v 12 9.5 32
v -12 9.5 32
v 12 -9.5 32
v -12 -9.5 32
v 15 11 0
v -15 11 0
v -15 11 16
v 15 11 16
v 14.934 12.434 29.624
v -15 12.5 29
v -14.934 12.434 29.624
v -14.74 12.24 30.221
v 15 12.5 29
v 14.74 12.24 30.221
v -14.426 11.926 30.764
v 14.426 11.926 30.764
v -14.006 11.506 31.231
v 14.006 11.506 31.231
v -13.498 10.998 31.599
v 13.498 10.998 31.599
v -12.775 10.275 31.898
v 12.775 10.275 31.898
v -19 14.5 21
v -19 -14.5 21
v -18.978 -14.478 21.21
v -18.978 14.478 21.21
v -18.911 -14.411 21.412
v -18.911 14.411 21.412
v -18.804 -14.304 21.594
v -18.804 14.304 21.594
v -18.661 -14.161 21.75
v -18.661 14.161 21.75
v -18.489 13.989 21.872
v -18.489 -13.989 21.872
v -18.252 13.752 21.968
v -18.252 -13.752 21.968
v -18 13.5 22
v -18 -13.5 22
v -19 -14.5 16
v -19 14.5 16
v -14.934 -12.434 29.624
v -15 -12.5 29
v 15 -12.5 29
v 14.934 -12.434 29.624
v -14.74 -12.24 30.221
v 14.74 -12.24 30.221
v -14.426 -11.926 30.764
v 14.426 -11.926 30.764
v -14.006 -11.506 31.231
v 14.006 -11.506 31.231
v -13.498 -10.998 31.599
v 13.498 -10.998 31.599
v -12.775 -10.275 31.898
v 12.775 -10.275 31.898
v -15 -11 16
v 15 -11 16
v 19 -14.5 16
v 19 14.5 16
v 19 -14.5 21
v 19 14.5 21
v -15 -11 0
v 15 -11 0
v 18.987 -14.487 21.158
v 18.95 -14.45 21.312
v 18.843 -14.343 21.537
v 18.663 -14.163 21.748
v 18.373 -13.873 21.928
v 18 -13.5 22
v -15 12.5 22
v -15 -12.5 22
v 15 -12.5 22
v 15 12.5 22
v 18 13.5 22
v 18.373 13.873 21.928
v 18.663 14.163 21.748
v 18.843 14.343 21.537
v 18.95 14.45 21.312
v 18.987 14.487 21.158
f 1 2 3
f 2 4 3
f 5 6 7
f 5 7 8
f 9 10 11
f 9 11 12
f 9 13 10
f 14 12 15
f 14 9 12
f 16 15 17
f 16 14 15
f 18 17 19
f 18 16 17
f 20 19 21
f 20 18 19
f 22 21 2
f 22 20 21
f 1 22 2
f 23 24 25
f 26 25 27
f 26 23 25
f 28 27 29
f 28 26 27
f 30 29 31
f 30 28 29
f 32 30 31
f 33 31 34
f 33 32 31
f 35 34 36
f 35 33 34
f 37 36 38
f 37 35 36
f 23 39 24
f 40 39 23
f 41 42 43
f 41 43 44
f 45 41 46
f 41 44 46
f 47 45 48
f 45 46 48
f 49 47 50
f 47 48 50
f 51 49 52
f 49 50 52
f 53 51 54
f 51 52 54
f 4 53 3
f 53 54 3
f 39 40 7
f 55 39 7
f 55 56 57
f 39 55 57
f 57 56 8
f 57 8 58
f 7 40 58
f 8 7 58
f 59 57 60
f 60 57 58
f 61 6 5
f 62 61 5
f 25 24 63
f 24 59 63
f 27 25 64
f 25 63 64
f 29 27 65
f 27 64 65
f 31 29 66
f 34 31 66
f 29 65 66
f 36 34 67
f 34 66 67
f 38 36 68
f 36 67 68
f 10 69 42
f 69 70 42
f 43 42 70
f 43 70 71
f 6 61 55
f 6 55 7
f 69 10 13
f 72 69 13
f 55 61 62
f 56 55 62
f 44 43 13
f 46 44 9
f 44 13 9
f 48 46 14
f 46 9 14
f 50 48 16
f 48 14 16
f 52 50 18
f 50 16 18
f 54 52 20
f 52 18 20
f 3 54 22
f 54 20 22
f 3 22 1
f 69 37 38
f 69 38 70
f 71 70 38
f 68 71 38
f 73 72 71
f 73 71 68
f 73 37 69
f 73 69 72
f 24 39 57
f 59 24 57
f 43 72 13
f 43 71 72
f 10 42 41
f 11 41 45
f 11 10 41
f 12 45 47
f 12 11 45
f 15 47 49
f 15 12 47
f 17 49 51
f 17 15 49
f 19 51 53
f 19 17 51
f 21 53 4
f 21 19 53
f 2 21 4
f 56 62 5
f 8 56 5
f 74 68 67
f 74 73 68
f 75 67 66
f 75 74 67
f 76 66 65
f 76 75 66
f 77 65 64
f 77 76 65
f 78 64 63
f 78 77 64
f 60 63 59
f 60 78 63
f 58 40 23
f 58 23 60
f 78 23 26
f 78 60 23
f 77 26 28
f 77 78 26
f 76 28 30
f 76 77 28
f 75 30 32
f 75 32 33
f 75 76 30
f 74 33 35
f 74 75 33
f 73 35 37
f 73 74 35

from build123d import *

# Parameters (mm, degrees)
F0_W     = 30
F0_H     = 22
F1_DEPTH = 16
F2_W     = 38
F2_H     = 29
F2_W_2   = 30
F2_H_2   = 22
F3_DEPTH = 6
F4_R     = 1
F5_W     = 30
F5_H     = 10
F6_DEPTH = 12.5
F7_R     = 3


with BuildPart() as f1:
    # F0 (on Top) → F1 (new body)
    with BuildSketch(Plane.XY):
        Rectangle(F0_W, F0_H)
    extrude(amount=F1_DEPTH)

    # F2 (on face) → F3 (join)
    with BuildSketch(Plane.XY.offset(16)):
        Rectangle(F2_W, F2_H)
        Rectangle(F2_W_2, F2_H_2, mode=Mode.SUBTRACT)
        Rectangle(F2_W_2, F2_H_2)
    extrude(amount=F3_DEPTH)

    # F4
    f4_edges = [f1.edges().sort_by_distance(p)[0] for p in [
        (19, 0, 22),
        (0, 14.5, 22),
        (-19, 0, 22),
        (0, -14.5, 22),
    ]]
    fillet(f4_edges, radius=F4_R)

    # F5 (on Front) → F6 (join, symmetric)
    with BuildSketch(Plane.XZ):
        with Locations((0, 27)):
            Rectangle(F5_W, F5_H)
    extrude(amount=F6_DEPTH, both=True)

    # F7
    f7_edges = [f1.edges().sort_by_distance(p)[0] for p in [
        (0, 12.5, 32),
        (-15, 0, 32),
        (0, -12.5, 32),
        (15, 0, 32),
    ]]
    fillet(f7_edges, radius=F7_R)


solid = f1.part
